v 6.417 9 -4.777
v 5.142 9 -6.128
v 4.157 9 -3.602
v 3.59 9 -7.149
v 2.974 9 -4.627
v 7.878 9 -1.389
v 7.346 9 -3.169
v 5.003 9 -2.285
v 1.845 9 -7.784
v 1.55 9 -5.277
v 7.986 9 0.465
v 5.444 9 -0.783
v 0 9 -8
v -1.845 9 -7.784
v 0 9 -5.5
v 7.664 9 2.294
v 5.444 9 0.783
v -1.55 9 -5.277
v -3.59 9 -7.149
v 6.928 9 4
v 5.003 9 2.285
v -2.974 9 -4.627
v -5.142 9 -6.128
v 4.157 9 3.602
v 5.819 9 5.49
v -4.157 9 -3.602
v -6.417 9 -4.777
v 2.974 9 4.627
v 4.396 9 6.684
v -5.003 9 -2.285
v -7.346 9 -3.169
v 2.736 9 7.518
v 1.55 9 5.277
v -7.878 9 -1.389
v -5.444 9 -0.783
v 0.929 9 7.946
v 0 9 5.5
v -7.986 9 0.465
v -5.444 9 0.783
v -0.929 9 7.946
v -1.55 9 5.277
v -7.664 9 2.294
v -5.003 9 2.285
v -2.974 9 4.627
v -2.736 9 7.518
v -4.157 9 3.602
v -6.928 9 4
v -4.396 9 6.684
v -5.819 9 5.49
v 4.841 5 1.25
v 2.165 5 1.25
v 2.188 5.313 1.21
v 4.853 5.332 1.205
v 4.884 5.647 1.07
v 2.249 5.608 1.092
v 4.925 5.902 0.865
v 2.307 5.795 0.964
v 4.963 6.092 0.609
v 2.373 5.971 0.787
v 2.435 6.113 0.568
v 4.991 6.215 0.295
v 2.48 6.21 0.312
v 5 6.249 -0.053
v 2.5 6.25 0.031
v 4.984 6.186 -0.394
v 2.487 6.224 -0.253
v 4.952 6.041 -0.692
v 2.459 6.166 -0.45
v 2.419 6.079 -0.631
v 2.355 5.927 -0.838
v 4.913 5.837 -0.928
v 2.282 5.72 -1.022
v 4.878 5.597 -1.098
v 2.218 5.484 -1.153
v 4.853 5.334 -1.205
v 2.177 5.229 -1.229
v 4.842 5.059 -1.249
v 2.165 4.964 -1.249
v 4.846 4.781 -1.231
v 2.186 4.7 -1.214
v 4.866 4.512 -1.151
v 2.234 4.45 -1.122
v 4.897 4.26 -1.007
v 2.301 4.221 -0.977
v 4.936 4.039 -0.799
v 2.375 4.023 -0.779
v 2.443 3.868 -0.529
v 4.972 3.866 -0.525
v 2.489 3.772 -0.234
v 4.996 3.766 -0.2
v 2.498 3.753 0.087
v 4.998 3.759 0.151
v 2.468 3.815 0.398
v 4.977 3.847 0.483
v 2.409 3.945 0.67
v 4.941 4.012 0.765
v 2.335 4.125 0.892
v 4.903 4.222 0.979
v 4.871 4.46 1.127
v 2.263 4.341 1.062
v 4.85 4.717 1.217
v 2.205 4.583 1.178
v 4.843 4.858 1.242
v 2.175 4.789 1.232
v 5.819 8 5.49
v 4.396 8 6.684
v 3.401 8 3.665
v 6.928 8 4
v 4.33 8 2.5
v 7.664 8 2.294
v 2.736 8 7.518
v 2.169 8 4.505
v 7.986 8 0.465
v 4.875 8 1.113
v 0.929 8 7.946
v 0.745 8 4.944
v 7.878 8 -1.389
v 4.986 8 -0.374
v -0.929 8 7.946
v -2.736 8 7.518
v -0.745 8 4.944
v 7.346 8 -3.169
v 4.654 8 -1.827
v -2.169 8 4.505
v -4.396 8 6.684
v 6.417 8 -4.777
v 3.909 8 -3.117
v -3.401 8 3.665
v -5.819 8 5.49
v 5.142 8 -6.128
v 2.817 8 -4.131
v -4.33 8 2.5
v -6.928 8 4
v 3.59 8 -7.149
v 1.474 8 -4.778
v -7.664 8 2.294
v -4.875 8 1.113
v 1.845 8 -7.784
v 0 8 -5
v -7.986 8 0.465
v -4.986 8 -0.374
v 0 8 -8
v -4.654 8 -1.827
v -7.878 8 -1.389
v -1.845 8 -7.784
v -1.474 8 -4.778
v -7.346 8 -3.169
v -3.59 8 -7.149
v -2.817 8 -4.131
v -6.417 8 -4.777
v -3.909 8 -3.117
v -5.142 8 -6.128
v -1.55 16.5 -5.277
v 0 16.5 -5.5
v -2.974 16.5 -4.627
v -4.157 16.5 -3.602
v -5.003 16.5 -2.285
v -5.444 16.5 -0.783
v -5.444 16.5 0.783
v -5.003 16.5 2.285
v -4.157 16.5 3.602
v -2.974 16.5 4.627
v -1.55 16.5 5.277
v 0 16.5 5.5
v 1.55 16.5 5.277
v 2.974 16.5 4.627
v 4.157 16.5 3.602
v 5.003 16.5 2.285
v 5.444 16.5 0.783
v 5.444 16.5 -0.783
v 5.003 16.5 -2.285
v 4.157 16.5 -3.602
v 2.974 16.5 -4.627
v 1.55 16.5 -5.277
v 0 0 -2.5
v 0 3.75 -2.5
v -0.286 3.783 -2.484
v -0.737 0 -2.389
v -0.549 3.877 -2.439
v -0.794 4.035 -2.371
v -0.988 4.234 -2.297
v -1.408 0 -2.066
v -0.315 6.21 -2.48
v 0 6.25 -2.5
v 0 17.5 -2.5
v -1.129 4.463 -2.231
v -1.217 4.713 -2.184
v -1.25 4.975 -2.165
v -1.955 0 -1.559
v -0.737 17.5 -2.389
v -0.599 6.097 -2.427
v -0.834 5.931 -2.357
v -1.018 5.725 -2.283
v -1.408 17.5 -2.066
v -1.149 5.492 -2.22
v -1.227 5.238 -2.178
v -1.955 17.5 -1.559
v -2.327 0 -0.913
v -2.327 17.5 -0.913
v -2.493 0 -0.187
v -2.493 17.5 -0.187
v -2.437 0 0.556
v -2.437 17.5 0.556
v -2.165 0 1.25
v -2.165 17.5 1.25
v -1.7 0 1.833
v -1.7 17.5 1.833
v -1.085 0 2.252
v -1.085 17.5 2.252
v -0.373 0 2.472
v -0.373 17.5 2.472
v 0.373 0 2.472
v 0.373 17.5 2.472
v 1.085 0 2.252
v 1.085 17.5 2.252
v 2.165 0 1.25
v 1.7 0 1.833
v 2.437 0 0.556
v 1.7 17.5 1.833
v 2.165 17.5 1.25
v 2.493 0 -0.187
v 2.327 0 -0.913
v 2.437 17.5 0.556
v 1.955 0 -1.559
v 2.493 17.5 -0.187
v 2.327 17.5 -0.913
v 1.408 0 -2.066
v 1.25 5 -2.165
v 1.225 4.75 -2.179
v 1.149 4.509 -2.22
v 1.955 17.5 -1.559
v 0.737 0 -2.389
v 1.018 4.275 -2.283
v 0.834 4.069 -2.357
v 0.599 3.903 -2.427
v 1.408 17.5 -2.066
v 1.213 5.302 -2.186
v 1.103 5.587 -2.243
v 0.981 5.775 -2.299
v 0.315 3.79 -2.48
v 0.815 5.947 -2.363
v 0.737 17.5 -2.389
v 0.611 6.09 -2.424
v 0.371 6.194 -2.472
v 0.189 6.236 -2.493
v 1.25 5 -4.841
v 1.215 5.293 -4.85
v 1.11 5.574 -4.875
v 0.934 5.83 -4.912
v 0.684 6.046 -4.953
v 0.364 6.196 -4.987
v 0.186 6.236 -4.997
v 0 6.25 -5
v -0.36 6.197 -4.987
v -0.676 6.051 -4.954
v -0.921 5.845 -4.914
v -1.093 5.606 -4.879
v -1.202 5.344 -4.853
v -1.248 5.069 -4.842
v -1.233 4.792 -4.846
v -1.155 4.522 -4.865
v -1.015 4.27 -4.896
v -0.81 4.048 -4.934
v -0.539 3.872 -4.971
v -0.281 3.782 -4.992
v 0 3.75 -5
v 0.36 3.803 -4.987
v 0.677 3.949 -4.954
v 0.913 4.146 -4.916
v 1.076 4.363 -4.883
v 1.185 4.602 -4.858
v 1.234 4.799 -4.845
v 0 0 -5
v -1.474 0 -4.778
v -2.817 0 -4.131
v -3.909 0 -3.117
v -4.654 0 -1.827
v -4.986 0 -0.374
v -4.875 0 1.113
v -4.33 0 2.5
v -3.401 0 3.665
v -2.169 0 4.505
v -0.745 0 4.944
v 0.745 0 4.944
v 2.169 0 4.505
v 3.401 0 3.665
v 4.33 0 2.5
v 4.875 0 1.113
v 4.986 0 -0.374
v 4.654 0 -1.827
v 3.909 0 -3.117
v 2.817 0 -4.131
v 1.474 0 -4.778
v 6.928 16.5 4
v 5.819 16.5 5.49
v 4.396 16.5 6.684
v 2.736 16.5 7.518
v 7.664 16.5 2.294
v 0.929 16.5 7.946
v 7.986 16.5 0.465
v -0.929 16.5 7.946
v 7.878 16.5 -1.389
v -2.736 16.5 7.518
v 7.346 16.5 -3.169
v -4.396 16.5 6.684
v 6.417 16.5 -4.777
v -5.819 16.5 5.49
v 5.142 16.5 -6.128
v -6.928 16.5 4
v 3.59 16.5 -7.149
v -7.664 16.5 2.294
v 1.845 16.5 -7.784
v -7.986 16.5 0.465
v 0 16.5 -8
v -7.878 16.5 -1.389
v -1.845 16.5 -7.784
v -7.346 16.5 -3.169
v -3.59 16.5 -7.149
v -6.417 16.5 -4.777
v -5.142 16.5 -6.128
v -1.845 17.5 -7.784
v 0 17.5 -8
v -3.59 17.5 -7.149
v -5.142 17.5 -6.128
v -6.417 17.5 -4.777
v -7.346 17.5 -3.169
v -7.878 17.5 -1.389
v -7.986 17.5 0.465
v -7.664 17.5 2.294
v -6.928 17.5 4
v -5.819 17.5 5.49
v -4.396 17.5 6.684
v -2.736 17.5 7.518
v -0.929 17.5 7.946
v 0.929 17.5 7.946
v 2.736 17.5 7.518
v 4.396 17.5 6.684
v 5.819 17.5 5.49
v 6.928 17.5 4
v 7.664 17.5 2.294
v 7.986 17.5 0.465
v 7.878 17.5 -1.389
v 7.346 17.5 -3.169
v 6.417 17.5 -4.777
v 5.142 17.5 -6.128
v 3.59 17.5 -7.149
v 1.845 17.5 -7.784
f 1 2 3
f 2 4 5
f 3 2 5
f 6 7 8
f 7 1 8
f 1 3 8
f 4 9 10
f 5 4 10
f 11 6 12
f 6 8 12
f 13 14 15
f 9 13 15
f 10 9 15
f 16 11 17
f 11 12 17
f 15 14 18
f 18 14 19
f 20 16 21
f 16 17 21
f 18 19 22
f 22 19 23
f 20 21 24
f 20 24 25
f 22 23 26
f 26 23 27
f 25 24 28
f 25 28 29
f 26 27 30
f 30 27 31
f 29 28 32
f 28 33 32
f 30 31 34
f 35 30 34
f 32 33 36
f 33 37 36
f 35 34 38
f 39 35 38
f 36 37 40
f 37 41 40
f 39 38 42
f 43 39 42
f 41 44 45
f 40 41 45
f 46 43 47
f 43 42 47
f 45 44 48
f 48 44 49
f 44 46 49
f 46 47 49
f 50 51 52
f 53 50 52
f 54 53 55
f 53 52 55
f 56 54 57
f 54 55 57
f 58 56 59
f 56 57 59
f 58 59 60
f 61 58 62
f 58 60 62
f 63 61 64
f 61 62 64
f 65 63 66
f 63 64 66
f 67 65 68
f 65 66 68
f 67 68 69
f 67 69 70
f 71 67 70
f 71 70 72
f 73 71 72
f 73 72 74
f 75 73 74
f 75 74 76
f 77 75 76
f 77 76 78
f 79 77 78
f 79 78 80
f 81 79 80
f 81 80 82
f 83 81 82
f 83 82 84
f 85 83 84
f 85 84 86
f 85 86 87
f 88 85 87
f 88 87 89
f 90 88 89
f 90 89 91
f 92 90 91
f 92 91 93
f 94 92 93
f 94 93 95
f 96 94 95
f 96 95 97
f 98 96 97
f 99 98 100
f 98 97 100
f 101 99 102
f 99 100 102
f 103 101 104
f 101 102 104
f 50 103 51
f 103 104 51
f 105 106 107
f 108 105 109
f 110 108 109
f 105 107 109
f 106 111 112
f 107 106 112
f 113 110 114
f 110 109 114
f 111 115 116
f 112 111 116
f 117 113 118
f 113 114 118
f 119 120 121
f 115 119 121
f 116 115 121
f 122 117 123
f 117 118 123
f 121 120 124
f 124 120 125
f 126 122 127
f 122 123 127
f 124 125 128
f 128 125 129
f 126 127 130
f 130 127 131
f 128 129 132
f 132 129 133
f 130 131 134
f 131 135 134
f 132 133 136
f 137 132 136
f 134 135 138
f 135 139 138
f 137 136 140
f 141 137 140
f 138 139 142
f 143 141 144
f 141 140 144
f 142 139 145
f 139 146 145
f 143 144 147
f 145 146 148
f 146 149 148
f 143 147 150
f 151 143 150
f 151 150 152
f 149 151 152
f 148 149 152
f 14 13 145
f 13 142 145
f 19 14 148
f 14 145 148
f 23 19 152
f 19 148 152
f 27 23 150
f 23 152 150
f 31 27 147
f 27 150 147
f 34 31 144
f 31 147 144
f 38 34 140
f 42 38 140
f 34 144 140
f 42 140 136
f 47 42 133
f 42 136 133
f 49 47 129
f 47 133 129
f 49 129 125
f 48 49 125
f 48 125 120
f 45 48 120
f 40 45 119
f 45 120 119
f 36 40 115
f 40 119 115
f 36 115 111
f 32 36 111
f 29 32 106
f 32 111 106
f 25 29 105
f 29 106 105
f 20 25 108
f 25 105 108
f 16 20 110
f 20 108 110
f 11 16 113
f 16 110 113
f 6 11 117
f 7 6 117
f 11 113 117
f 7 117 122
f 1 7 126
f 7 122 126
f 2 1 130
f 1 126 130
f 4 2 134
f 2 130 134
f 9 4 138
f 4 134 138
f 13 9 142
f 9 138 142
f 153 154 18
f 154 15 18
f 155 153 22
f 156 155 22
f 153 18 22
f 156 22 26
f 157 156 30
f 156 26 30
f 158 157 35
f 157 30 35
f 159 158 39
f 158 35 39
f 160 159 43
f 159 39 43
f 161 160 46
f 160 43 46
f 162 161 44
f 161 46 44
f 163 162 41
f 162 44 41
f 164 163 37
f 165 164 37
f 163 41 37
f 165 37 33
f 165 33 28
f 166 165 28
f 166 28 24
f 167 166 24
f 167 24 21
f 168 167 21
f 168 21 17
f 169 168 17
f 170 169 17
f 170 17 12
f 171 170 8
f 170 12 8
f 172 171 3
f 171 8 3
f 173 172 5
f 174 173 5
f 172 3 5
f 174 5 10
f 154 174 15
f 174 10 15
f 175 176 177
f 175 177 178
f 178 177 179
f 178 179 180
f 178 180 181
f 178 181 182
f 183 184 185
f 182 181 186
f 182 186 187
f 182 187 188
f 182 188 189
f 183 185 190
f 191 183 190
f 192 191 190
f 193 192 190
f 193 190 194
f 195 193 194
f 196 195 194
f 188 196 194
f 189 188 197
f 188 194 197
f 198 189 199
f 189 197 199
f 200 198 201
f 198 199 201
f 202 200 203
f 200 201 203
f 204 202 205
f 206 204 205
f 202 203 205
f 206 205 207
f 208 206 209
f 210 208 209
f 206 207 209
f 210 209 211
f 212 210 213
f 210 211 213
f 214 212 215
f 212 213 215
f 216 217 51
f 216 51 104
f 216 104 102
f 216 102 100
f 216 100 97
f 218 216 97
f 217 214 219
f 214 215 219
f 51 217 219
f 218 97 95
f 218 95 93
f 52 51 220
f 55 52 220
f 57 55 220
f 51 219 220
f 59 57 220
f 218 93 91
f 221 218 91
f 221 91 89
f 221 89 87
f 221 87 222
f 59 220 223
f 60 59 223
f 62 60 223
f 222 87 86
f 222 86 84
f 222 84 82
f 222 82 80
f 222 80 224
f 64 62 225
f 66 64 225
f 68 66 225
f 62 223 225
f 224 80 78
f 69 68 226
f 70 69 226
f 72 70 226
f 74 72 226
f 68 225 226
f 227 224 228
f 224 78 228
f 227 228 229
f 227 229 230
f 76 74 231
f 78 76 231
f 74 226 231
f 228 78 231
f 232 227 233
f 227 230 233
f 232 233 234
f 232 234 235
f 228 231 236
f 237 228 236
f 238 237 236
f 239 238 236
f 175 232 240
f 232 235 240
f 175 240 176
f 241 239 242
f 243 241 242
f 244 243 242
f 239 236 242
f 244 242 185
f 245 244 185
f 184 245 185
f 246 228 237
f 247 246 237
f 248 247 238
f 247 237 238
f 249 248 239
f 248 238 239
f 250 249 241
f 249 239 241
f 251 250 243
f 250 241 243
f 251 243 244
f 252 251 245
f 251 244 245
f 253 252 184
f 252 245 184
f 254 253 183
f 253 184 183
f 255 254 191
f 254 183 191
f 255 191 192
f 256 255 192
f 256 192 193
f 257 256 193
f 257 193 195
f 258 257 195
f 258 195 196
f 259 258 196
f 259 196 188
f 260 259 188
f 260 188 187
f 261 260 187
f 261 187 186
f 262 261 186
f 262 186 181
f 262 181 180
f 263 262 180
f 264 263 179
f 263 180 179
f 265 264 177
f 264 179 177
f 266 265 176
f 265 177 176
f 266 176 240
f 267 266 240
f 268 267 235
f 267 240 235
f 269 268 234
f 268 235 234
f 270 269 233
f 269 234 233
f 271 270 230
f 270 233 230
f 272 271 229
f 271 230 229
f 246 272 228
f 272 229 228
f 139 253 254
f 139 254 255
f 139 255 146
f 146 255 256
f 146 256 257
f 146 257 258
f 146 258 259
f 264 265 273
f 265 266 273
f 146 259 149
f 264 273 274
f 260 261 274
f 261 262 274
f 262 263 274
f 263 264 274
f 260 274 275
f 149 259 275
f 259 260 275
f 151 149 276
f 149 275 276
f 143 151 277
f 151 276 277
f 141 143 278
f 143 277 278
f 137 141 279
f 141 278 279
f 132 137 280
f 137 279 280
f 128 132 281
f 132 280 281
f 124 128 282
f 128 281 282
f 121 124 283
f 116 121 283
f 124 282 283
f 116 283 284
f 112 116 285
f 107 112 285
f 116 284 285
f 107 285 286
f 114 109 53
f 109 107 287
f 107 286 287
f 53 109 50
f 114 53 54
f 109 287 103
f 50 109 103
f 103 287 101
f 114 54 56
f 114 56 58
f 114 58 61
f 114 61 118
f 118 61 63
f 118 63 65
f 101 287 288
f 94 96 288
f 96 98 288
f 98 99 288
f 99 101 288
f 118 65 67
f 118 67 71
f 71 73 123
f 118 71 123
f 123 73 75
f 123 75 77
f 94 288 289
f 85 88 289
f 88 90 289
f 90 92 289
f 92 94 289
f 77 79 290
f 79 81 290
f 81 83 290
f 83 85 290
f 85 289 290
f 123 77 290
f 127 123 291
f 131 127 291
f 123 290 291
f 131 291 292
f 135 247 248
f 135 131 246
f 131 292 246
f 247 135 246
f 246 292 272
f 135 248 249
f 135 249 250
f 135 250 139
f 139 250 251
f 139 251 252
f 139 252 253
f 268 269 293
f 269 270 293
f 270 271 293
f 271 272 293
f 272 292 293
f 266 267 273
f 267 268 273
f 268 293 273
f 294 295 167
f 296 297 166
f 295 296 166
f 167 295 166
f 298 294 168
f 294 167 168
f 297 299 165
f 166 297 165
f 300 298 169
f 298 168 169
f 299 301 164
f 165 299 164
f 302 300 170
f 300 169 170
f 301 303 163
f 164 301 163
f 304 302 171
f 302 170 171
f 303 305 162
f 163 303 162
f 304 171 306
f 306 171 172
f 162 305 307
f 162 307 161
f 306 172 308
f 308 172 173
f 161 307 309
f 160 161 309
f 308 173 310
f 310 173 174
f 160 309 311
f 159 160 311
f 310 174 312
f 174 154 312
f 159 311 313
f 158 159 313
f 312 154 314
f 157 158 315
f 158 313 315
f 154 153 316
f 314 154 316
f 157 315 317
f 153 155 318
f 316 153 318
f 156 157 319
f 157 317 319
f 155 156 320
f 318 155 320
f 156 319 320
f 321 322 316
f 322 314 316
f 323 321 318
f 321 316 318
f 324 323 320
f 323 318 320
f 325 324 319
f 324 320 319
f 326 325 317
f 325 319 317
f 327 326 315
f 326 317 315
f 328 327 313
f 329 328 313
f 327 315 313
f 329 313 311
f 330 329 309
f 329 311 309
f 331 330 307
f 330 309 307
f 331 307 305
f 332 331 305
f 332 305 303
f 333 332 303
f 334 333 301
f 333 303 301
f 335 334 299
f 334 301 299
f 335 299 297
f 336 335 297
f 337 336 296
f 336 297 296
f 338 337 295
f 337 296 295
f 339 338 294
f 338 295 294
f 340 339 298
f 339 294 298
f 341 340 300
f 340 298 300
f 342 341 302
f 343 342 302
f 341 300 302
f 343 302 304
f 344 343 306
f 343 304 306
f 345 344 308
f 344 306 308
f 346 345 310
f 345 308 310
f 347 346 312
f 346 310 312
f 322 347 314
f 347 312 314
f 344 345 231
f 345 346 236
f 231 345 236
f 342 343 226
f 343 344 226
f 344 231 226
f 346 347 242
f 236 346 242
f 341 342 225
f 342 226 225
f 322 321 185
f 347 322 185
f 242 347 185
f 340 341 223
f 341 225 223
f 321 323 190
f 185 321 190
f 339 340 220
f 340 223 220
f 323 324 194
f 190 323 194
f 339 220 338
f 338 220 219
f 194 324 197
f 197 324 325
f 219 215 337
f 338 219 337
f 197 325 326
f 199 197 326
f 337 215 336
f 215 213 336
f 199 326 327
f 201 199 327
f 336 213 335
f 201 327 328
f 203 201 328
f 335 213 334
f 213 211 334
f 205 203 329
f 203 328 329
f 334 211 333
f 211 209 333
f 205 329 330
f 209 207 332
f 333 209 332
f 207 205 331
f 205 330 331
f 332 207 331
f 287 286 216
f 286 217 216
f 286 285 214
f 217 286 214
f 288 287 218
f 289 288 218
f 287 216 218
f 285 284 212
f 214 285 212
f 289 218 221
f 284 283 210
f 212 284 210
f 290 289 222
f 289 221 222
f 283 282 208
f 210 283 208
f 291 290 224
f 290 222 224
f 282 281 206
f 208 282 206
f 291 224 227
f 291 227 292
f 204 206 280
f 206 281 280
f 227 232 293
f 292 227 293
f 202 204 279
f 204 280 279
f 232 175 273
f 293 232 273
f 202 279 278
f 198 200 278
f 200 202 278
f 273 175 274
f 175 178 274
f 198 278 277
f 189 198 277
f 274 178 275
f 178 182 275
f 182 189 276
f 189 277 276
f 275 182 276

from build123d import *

# Parameters (mm, degrees)
CORTAR_EXTRUIR1_REACH      = 22.839
CORTAR_EXTRUIR1_END_RADIUS = 5
CROQUIS2_R                 = 1.25
MATRIZC1_COUNT             = 2
MATRIZC1_ANGLE             = 90


with BuildPart() as part:
    # Croquis1 → Revolución1 (revolve)
    with BuildSketch(Plane.XY, mode=Mode.PRIVATE) as revoluci_n1_sk:
        Polygon((8, 8), (5, 8), (5, 0), (2.5, 0), (2.5, 17.5), (8, 17.5), (8, 16.5), (5.5, 16.5), (5.5, 9), (8, 9), align=None)
    revolve(revoluci_n1_sk.sketch.rotate(Axis((0, 0, 0), (0, 1, 0)), 90), axis=Axis((0, 0, 0), (0, 1, 0)))

    # Cortar-Extruir1: up to this cylinder (the profile starts inside it)
    cortar_extruir1_end = Plane(origin=(0, 5, 0), z_dir=(0, -1, 0)) * Cylinder(CORTAR_EXTRUIR1_END_RADIUS, 56.678, mode=Mode.PRIVATE)
    # Croquis2 → Cortar-Extruir1 (cut, up to the surface)
    with BuildSketch(Plane.XY, mode=Mode.PRIVATE) as cortar_extruir1_sk1:
        with Locations((0, 5)):
            Circle(CROQUIS2_R)
    cortar_extruir1_tool1 = extrude(cortar_extruir1_sk1.sketch, amount=-CORTAR_EXTRUIR1_REACH, mode=Mode.PRIVATE) & cortar_extruir1_end
    cortar_extruir1 = cortar_extruir1_tool1.solids().sort_by_distance((0, 5, 0))[0]
    add(cortar_extruir1, mode=Mode.SUBTRACT)

    # MatrizC1: Cortar-Extruir1 ×2 about axis
    matrizc1_axis = Axis((0, 0, 0), (0, -1, 0))
    for i in range(1, MATRIZC1_COUNT):
        add(cortar_extruir1.rotate(matrizc1_axis, i * MATRIZC1_ANGLE / (MATRIZC1_COUNT - 1)), mode=Mode.SUBTRACT)


solid = part.part
